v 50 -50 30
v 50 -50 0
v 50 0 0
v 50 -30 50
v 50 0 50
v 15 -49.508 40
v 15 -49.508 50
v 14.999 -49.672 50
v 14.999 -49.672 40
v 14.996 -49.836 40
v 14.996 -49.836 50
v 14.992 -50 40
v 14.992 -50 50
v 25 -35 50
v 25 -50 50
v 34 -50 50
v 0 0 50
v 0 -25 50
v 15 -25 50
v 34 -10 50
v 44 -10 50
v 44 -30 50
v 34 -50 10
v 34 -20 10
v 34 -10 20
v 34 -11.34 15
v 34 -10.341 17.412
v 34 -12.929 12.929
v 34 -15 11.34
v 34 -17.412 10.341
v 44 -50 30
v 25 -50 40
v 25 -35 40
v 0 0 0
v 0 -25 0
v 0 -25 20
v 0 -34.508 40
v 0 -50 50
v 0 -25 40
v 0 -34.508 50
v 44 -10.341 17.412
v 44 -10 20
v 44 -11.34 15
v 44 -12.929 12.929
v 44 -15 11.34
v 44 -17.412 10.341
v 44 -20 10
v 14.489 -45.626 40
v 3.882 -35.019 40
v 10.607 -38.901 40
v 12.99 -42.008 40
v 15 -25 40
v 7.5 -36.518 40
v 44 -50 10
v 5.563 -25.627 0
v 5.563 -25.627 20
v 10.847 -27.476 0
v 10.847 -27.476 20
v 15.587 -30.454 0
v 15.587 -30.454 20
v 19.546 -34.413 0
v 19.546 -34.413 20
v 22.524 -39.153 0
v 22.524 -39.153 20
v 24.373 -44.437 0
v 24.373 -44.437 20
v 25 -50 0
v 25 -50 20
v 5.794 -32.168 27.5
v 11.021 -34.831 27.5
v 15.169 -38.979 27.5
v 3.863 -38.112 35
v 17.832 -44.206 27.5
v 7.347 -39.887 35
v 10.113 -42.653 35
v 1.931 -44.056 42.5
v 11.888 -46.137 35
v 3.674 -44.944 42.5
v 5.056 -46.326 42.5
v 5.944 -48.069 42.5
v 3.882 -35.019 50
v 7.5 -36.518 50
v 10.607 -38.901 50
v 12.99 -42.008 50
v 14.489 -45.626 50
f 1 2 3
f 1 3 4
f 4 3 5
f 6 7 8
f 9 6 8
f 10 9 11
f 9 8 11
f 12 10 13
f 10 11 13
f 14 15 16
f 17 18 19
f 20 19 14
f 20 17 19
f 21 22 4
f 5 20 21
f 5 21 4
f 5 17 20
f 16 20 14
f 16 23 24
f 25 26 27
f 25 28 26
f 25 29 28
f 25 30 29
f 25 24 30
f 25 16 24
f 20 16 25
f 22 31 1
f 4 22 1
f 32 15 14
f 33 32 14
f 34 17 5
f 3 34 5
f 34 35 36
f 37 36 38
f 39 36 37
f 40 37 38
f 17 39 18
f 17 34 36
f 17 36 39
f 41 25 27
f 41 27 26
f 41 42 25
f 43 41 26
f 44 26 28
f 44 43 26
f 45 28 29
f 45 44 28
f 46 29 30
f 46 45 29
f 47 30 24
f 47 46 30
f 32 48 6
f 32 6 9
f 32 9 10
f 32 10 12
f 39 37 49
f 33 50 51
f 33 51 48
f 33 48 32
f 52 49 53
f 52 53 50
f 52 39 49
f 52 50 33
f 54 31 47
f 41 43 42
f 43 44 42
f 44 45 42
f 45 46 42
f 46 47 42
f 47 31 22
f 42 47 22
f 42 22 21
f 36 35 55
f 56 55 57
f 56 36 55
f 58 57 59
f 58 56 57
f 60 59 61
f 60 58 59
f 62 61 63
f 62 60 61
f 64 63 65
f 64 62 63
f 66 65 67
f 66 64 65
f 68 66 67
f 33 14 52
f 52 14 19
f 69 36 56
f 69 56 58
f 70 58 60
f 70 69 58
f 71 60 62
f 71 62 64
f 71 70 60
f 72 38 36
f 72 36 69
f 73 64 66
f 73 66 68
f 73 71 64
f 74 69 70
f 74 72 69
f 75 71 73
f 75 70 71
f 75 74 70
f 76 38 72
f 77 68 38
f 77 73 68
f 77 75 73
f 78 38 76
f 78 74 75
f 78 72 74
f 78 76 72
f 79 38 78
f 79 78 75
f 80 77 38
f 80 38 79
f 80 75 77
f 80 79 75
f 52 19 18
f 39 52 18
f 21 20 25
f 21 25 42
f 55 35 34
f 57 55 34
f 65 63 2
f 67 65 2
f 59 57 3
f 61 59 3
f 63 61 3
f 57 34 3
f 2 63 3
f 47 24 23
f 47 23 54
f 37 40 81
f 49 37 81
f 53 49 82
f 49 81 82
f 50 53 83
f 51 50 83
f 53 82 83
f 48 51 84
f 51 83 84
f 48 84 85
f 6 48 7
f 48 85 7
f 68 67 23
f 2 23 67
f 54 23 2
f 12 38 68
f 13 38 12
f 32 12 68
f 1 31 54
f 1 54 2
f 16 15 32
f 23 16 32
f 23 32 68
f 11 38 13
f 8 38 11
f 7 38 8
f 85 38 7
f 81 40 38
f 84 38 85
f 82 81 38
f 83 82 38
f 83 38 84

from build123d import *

# Parameters (mm, degrees)
F0_W          = 50
F0_H          = 50
F1_DEPTH      = 50
F2_W          = 10
F2_H          = 40
F3_DEPTH      = 40
F4_R          = 10
F5_SIZE       = 20
F7_ANGLE_BACK = 90
F7_ANGLE      = 180
F10_DEPTH     = 10


with BuildPart() as f1:
    # F0 (on Front) → F1 (new body)
    with BuildSketch(Plane.XZ):
        with Locations((25, 25)):
            Rectangle(F0_W, F0_H)
    extrude(amount=F1_DEPTH)

    # F2 (on face) → F3 (cut)
    with BuildSketch(Plane.XY.offset(50)):
        with Locations((39, -30)):
            Rectangle(F2_W, F2_H)
    extrude(amount=-F3_DEPTH, mode=Mode.SUBTRACT)

    # F4
    f4_edges = [f1.edges().sort_by_distance(p)[0] for p in [
        (39, -10, 10),
    ]]
    fillet(f4_edges, radius=F4_R)

    # F5
    f5_edges = [f1.edges().sort_by_distance(p)[0] for p in [
        (47, -50, 50),
    ]]
    chamfer(f5_edges, length=F5_SIZE)

    # F6 (on face) → F7 (revolve, cut)
    with BuildSketch(Plane.XZ.offset(50), mode=Mode.PRIVATE) as f7_sk:
        Polygon((25, 20), (0, 50), (0, 0), (25, 0), align=None)
    revolve(f7_sk.sketch.rotate(Axis((0, -50, 25), (0, 0, -1)), -F7_ANGLE_BACK), axis=Axis((0, -50, 25), (0, 0, -1)), revolution_arc=F7_ANGLE, mode=Mode.SUBTRACT)

    # F9 (on face) → F10 (cut)
    with BuildSketch(Plane.XY.offset(50)):
        with BuildLine():
            ThreePointArc((0, -34.5079771981), (10.6066017178, -38.9013754803), (15, -49.5079771981))
            ThreePointArc((15, -49.5079771981), (14.9979819343, -49.7540217013), (14.9919282803, -50))
            Line((14.9919282803, -50), (25, -50))
            Line((25, -50), (25, -35))
            Line((25, -35), (15, -25))
            Line((15, -25), (0, -25))
            Line((0, -25), (0, -34.5079771981))
        make_face()
    extrude(amount=-F10_DEPTH, mode=Mode.SUBTRACT)


solid = f1.part
